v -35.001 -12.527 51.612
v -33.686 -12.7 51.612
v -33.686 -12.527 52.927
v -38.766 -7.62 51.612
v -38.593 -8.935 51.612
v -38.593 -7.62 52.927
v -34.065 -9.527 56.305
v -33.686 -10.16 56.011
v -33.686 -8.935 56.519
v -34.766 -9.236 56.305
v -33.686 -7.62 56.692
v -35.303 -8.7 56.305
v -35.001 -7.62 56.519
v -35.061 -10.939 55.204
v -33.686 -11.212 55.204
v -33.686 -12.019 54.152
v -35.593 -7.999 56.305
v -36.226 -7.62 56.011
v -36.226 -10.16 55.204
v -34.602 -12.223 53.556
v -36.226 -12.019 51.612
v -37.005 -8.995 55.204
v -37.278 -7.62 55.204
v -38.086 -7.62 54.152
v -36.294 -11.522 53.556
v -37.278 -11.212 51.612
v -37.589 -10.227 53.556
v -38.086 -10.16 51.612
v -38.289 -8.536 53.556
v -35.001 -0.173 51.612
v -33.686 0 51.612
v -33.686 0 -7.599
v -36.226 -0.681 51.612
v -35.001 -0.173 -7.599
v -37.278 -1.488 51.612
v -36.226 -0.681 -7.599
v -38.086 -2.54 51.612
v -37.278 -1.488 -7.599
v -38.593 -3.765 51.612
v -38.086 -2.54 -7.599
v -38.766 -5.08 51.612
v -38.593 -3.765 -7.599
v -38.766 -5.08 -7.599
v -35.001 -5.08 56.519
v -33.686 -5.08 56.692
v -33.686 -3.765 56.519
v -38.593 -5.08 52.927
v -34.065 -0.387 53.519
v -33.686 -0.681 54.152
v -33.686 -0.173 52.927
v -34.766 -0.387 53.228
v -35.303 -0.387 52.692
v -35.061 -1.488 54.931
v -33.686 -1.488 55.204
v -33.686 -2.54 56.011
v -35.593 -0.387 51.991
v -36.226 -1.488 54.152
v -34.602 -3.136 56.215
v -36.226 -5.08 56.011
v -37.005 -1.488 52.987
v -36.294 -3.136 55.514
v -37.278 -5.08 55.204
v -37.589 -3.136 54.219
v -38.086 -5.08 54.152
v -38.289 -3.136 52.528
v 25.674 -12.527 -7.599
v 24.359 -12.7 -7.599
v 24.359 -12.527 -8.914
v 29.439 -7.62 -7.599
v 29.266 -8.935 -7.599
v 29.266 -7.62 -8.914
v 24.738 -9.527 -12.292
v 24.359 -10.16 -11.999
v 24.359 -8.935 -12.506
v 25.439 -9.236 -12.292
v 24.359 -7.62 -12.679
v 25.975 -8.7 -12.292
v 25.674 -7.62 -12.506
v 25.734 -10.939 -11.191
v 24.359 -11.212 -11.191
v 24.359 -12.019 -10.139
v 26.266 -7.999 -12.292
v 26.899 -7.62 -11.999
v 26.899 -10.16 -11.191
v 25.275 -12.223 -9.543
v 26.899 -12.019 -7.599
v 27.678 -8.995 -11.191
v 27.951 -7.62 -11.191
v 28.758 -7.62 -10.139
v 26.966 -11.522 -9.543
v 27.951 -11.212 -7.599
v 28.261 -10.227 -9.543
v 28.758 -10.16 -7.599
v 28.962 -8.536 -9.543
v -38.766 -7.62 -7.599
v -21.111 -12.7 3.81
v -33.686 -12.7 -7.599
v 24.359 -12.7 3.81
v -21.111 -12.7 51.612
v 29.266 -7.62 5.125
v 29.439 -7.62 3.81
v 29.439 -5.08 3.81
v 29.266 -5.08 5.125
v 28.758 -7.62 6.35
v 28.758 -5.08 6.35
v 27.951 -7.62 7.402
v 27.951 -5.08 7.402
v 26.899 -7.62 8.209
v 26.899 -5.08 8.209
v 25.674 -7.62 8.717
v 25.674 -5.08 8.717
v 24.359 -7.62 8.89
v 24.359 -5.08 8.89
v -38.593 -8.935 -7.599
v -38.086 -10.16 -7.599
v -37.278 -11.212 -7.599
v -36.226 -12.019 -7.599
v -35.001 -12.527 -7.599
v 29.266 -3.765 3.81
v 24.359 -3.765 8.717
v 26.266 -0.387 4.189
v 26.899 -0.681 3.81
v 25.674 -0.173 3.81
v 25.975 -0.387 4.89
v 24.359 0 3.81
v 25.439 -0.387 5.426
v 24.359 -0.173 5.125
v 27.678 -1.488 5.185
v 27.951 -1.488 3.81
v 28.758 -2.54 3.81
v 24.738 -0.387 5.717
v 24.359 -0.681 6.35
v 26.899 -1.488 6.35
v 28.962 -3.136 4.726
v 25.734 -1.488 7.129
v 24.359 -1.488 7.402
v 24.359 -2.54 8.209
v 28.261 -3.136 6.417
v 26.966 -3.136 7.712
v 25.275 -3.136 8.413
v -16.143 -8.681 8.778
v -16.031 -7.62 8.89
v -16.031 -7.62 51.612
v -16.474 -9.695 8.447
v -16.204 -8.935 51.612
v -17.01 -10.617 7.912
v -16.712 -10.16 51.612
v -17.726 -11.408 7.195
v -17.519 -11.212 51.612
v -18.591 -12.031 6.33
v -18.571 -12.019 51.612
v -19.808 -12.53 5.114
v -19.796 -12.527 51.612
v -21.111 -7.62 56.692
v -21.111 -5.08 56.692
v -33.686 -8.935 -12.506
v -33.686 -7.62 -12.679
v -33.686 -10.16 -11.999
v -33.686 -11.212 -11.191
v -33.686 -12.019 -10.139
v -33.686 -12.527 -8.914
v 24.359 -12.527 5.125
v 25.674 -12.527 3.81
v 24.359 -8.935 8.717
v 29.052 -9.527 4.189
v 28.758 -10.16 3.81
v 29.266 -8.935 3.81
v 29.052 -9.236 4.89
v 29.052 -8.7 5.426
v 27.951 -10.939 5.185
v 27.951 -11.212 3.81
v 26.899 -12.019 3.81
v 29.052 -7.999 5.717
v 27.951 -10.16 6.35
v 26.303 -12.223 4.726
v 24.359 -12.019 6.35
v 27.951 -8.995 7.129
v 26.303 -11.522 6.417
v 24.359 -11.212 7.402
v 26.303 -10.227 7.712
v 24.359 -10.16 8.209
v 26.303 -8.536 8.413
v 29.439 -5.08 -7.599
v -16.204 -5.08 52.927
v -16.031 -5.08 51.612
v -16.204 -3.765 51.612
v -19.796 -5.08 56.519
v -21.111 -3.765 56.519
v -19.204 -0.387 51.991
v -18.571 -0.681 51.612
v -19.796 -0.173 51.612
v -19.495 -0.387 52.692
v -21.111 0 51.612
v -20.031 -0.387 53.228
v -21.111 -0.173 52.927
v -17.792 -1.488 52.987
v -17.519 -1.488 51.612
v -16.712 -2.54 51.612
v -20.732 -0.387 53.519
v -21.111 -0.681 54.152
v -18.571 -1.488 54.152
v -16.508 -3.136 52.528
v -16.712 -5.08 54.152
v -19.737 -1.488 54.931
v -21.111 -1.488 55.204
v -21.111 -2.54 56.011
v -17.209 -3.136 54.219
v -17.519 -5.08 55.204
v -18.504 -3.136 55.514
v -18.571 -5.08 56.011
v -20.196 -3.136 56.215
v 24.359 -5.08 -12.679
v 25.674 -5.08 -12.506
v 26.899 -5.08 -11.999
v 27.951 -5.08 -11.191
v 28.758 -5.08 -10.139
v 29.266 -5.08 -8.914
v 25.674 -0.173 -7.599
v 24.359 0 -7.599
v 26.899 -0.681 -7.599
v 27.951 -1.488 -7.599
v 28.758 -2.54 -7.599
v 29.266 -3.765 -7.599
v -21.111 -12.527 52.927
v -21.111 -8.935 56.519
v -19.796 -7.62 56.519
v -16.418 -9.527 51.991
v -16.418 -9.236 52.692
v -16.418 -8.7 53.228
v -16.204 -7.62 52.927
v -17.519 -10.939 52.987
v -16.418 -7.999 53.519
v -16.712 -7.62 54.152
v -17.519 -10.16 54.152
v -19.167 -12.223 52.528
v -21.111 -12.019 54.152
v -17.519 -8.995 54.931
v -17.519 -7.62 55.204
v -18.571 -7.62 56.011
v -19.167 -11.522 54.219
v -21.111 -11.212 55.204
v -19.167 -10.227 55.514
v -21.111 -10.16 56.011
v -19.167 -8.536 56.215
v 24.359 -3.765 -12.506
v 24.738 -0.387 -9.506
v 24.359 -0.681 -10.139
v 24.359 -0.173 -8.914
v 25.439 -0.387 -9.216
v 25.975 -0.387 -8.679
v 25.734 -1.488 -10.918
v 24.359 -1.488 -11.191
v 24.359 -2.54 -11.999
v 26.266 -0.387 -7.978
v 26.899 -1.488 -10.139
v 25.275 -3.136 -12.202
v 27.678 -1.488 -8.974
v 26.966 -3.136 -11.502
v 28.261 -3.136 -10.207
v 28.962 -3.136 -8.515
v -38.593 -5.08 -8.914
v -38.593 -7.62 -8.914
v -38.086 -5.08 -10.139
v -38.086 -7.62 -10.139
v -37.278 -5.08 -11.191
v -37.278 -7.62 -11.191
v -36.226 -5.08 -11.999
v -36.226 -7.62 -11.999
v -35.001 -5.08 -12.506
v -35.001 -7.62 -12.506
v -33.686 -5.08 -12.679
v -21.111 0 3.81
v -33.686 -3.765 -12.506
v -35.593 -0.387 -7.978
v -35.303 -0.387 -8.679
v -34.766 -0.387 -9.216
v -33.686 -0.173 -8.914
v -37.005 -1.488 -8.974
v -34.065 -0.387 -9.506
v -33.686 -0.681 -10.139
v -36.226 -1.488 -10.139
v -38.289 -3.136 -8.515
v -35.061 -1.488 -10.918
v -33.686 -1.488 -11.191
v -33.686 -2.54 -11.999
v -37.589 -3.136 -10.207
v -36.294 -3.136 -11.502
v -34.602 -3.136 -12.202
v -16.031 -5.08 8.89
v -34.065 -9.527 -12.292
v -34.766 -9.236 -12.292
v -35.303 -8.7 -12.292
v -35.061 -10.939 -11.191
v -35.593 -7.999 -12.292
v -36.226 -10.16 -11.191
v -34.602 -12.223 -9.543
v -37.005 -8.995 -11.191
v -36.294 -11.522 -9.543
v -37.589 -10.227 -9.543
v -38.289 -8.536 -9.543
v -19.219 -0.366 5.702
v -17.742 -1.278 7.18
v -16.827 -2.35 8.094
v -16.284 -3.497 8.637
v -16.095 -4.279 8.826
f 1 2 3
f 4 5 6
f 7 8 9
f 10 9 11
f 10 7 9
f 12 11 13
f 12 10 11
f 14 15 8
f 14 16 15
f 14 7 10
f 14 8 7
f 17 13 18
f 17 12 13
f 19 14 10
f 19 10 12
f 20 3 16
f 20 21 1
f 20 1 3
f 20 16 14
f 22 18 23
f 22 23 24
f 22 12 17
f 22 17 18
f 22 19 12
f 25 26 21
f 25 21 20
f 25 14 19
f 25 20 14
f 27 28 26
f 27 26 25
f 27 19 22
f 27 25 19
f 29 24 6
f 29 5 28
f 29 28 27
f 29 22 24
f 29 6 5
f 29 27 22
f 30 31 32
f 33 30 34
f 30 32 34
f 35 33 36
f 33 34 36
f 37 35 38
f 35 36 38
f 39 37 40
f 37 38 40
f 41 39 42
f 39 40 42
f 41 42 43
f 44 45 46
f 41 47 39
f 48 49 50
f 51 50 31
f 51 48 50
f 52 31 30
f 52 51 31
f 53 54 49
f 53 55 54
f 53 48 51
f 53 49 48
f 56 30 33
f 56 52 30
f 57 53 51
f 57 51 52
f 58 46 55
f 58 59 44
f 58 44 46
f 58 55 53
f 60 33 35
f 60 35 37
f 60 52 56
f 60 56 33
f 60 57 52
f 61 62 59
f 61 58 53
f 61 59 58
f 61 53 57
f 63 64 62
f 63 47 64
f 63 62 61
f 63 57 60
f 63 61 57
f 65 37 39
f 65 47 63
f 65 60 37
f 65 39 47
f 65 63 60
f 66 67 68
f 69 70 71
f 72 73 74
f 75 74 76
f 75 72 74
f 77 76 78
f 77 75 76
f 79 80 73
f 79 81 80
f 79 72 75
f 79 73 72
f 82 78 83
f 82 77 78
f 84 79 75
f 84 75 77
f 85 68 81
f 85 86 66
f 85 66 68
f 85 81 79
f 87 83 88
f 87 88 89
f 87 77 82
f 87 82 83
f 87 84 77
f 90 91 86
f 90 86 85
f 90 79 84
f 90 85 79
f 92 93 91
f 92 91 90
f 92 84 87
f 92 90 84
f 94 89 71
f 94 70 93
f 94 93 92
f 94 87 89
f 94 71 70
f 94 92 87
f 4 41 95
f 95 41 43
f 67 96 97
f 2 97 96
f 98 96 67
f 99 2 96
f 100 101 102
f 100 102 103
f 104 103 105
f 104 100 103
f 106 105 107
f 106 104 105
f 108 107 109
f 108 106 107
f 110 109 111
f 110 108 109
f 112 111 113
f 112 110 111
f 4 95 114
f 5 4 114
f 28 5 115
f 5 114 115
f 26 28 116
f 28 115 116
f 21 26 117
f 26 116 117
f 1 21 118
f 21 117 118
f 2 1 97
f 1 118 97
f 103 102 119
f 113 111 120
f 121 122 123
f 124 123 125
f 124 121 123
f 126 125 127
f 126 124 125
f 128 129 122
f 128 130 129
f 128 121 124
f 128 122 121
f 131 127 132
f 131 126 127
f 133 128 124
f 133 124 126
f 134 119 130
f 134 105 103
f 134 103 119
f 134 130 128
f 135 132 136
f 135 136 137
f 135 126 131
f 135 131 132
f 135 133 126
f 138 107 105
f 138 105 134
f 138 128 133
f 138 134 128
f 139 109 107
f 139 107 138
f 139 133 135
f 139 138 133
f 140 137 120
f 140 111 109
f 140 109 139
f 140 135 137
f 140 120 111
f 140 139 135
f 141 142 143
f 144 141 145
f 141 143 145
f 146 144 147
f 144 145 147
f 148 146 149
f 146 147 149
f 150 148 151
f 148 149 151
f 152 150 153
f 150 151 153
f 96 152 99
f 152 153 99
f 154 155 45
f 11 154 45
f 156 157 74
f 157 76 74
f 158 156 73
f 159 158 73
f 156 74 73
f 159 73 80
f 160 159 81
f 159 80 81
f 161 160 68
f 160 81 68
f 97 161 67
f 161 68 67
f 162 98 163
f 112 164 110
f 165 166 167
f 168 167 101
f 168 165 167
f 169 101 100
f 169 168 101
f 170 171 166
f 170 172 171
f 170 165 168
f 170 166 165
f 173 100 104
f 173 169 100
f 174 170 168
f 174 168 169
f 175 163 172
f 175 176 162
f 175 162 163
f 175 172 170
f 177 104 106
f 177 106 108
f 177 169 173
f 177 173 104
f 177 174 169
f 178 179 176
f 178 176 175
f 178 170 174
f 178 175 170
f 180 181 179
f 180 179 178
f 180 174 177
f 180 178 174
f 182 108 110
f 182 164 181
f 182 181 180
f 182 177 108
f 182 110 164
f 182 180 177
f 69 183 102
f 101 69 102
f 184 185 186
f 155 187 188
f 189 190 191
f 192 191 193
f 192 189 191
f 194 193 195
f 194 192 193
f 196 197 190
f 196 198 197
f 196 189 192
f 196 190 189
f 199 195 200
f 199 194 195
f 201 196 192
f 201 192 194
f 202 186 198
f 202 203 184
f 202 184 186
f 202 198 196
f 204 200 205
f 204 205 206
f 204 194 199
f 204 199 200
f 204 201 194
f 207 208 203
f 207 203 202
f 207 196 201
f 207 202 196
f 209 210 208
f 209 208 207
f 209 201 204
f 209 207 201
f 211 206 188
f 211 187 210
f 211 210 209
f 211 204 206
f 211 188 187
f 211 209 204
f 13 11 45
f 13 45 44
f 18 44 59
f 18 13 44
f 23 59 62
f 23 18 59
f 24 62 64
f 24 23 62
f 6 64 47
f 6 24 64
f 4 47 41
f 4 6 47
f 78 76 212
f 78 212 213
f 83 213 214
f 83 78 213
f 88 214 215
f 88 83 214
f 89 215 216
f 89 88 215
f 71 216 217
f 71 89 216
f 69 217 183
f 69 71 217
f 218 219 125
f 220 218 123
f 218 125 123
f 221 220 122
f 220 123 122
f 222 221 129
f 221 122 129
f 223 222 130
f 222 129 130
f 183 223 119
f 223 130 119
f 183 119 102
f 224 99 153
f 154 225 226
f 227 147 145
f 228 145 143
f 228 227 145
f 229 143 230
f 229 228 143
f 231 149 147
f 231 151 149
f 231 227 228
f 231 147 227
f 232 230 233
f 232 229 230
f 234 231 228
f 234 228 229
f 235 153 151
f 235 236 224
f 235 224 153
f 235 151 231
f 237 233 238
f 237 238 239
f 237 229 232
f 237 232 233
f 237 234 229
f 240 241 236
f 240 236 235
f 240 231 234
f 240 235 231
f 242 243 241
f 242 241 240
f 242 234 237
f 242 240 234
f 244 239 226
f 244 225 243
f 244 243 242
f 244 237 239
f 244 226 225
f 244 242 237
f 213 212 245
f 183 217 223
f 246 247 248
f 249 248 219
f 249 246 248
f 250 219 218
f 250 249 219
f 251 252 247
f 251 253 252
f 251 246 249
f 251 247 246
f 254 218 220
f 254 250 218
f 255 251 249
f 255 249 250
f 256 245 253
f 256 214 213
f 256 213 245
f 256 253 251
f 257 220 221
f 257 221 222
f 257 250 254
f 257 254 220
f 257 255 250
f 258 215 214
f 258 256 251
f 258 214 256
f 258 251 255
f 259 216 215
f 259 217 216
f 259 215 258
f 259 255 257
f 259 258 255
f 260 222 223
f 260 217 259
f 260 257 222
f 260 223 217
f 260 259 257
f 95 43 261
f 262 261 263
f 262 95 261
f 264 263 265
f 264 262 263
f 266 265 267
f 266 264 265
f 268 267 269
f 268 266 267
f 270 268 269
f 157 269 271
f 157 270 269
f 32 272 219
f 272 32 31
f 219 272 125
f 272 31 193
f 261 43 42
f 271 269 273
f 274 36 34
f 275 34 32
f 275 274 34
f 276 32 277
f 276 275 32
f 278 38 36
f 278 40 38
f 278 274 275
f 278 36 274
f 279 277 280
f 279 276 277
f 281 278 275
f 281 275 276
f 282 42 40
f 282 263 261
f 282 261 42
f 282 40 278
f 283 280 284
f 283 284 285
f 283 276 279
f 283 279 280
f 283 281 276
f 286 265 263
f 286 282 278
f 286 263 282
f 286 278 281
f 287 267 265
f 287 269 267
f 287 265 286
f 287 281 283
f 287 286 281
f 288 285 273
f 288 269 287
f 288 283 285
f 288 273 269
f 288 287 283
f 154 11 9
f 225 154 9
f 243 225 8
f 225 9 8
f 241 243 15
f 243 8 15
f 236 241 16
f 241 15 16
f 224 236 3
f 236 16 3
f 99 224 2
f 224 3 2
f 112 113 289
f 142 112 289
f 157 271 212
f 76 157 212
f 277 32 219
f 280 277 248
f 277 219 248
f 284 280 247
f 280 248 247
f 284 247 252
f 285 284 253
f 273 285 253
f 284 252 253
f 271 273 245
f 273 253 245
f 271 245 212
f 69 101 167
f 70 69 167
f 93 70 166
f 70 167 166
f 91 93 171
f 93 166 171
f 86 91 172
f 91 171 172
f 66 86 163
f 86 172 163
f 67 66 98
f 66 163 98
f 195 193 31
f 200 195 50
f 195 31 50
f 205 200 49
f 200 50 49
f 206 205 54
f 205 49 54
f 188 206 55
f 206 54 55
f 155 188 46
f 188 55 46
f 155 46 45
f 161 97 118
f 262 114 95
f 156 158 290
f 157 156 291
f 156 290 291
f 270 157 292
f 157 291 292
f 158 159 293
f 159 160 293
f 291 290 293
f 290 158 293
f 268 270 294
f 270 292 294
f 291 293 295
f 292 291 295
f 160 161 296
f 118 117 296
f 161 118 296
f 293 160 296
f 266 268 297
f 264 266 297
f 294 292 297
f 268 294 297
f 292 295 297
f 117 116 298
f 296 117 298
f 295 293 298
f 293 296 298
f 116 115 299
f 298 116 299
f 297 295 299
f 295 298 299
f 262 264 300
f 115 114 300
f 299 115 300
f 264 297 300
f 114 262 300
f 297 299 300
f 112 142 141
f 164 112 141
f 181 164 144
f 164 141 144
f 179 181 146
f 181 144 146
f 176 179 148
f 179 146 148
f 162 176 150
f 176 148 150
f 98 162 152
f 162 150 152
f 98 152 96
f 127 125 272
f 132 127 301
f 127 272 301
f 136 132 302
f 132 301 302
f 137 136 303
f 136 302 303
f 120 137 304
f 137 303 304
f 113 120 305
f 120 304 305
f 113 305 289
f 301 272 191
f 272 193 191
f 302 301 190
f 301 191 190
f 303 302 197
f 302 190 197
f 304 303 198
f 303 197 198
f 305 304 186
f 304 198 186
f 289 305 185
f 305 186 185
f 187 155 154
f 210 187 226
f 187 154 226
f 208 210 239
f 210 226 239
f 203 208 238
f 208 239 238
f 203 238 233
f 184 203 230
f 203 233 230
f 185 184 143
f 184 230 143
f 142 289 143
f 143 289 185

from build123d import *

# Parameters (mm, degrees)
F1_DEPTH = 12.7
F2_R     = 5.08
F3_R     = 5.08


with BuildPart() as f1:
    # F0 (on Front) → F1 (new body)
    with BuildSketch(Plane.XZ):
        Polygon((-16.031148, 56.691967), (-38.766231, 56.691967), (-38.766231, -12.67918), (29.439015, -12.67918), (29.439015, 8.89), (-16.031148, 8.89), align=None)
    extrude(amount=F1_DEPTH)

    # F2
    f2_edges = [f1.edges().sort_by_distance(p)[0] for p in [
        (-38.766231, -12.7, 22.006393),
        (-27.39869, -12.7, 56.691967),
        (-16.031148, -12.7, 32.790984),
        (6.703934, -12.7, 8.89),
        (29.439015, -12.7, -1.89459),
        (-4.663608, -12.7, -12.67918),
        (29.439015, -6.35, -12.67918),
        (29.439015, -6.35, 8.89),
        (-16.031148, -6.35, 56.691967),
        (-38.766231, -6.35, 56.691967),
        (-38.766231, -6.35, -12.67918),
    ]]
    fillet(f2_edges, radius=F2_R)

    # F3
    f3_edges = [f1.edges().sort_by_distance(p)[0] for p in [
        (-4.663608, 0, -12.67918),
    ]]
    fillet(f3_edges, radius=F3_R)


solid = f1.part
